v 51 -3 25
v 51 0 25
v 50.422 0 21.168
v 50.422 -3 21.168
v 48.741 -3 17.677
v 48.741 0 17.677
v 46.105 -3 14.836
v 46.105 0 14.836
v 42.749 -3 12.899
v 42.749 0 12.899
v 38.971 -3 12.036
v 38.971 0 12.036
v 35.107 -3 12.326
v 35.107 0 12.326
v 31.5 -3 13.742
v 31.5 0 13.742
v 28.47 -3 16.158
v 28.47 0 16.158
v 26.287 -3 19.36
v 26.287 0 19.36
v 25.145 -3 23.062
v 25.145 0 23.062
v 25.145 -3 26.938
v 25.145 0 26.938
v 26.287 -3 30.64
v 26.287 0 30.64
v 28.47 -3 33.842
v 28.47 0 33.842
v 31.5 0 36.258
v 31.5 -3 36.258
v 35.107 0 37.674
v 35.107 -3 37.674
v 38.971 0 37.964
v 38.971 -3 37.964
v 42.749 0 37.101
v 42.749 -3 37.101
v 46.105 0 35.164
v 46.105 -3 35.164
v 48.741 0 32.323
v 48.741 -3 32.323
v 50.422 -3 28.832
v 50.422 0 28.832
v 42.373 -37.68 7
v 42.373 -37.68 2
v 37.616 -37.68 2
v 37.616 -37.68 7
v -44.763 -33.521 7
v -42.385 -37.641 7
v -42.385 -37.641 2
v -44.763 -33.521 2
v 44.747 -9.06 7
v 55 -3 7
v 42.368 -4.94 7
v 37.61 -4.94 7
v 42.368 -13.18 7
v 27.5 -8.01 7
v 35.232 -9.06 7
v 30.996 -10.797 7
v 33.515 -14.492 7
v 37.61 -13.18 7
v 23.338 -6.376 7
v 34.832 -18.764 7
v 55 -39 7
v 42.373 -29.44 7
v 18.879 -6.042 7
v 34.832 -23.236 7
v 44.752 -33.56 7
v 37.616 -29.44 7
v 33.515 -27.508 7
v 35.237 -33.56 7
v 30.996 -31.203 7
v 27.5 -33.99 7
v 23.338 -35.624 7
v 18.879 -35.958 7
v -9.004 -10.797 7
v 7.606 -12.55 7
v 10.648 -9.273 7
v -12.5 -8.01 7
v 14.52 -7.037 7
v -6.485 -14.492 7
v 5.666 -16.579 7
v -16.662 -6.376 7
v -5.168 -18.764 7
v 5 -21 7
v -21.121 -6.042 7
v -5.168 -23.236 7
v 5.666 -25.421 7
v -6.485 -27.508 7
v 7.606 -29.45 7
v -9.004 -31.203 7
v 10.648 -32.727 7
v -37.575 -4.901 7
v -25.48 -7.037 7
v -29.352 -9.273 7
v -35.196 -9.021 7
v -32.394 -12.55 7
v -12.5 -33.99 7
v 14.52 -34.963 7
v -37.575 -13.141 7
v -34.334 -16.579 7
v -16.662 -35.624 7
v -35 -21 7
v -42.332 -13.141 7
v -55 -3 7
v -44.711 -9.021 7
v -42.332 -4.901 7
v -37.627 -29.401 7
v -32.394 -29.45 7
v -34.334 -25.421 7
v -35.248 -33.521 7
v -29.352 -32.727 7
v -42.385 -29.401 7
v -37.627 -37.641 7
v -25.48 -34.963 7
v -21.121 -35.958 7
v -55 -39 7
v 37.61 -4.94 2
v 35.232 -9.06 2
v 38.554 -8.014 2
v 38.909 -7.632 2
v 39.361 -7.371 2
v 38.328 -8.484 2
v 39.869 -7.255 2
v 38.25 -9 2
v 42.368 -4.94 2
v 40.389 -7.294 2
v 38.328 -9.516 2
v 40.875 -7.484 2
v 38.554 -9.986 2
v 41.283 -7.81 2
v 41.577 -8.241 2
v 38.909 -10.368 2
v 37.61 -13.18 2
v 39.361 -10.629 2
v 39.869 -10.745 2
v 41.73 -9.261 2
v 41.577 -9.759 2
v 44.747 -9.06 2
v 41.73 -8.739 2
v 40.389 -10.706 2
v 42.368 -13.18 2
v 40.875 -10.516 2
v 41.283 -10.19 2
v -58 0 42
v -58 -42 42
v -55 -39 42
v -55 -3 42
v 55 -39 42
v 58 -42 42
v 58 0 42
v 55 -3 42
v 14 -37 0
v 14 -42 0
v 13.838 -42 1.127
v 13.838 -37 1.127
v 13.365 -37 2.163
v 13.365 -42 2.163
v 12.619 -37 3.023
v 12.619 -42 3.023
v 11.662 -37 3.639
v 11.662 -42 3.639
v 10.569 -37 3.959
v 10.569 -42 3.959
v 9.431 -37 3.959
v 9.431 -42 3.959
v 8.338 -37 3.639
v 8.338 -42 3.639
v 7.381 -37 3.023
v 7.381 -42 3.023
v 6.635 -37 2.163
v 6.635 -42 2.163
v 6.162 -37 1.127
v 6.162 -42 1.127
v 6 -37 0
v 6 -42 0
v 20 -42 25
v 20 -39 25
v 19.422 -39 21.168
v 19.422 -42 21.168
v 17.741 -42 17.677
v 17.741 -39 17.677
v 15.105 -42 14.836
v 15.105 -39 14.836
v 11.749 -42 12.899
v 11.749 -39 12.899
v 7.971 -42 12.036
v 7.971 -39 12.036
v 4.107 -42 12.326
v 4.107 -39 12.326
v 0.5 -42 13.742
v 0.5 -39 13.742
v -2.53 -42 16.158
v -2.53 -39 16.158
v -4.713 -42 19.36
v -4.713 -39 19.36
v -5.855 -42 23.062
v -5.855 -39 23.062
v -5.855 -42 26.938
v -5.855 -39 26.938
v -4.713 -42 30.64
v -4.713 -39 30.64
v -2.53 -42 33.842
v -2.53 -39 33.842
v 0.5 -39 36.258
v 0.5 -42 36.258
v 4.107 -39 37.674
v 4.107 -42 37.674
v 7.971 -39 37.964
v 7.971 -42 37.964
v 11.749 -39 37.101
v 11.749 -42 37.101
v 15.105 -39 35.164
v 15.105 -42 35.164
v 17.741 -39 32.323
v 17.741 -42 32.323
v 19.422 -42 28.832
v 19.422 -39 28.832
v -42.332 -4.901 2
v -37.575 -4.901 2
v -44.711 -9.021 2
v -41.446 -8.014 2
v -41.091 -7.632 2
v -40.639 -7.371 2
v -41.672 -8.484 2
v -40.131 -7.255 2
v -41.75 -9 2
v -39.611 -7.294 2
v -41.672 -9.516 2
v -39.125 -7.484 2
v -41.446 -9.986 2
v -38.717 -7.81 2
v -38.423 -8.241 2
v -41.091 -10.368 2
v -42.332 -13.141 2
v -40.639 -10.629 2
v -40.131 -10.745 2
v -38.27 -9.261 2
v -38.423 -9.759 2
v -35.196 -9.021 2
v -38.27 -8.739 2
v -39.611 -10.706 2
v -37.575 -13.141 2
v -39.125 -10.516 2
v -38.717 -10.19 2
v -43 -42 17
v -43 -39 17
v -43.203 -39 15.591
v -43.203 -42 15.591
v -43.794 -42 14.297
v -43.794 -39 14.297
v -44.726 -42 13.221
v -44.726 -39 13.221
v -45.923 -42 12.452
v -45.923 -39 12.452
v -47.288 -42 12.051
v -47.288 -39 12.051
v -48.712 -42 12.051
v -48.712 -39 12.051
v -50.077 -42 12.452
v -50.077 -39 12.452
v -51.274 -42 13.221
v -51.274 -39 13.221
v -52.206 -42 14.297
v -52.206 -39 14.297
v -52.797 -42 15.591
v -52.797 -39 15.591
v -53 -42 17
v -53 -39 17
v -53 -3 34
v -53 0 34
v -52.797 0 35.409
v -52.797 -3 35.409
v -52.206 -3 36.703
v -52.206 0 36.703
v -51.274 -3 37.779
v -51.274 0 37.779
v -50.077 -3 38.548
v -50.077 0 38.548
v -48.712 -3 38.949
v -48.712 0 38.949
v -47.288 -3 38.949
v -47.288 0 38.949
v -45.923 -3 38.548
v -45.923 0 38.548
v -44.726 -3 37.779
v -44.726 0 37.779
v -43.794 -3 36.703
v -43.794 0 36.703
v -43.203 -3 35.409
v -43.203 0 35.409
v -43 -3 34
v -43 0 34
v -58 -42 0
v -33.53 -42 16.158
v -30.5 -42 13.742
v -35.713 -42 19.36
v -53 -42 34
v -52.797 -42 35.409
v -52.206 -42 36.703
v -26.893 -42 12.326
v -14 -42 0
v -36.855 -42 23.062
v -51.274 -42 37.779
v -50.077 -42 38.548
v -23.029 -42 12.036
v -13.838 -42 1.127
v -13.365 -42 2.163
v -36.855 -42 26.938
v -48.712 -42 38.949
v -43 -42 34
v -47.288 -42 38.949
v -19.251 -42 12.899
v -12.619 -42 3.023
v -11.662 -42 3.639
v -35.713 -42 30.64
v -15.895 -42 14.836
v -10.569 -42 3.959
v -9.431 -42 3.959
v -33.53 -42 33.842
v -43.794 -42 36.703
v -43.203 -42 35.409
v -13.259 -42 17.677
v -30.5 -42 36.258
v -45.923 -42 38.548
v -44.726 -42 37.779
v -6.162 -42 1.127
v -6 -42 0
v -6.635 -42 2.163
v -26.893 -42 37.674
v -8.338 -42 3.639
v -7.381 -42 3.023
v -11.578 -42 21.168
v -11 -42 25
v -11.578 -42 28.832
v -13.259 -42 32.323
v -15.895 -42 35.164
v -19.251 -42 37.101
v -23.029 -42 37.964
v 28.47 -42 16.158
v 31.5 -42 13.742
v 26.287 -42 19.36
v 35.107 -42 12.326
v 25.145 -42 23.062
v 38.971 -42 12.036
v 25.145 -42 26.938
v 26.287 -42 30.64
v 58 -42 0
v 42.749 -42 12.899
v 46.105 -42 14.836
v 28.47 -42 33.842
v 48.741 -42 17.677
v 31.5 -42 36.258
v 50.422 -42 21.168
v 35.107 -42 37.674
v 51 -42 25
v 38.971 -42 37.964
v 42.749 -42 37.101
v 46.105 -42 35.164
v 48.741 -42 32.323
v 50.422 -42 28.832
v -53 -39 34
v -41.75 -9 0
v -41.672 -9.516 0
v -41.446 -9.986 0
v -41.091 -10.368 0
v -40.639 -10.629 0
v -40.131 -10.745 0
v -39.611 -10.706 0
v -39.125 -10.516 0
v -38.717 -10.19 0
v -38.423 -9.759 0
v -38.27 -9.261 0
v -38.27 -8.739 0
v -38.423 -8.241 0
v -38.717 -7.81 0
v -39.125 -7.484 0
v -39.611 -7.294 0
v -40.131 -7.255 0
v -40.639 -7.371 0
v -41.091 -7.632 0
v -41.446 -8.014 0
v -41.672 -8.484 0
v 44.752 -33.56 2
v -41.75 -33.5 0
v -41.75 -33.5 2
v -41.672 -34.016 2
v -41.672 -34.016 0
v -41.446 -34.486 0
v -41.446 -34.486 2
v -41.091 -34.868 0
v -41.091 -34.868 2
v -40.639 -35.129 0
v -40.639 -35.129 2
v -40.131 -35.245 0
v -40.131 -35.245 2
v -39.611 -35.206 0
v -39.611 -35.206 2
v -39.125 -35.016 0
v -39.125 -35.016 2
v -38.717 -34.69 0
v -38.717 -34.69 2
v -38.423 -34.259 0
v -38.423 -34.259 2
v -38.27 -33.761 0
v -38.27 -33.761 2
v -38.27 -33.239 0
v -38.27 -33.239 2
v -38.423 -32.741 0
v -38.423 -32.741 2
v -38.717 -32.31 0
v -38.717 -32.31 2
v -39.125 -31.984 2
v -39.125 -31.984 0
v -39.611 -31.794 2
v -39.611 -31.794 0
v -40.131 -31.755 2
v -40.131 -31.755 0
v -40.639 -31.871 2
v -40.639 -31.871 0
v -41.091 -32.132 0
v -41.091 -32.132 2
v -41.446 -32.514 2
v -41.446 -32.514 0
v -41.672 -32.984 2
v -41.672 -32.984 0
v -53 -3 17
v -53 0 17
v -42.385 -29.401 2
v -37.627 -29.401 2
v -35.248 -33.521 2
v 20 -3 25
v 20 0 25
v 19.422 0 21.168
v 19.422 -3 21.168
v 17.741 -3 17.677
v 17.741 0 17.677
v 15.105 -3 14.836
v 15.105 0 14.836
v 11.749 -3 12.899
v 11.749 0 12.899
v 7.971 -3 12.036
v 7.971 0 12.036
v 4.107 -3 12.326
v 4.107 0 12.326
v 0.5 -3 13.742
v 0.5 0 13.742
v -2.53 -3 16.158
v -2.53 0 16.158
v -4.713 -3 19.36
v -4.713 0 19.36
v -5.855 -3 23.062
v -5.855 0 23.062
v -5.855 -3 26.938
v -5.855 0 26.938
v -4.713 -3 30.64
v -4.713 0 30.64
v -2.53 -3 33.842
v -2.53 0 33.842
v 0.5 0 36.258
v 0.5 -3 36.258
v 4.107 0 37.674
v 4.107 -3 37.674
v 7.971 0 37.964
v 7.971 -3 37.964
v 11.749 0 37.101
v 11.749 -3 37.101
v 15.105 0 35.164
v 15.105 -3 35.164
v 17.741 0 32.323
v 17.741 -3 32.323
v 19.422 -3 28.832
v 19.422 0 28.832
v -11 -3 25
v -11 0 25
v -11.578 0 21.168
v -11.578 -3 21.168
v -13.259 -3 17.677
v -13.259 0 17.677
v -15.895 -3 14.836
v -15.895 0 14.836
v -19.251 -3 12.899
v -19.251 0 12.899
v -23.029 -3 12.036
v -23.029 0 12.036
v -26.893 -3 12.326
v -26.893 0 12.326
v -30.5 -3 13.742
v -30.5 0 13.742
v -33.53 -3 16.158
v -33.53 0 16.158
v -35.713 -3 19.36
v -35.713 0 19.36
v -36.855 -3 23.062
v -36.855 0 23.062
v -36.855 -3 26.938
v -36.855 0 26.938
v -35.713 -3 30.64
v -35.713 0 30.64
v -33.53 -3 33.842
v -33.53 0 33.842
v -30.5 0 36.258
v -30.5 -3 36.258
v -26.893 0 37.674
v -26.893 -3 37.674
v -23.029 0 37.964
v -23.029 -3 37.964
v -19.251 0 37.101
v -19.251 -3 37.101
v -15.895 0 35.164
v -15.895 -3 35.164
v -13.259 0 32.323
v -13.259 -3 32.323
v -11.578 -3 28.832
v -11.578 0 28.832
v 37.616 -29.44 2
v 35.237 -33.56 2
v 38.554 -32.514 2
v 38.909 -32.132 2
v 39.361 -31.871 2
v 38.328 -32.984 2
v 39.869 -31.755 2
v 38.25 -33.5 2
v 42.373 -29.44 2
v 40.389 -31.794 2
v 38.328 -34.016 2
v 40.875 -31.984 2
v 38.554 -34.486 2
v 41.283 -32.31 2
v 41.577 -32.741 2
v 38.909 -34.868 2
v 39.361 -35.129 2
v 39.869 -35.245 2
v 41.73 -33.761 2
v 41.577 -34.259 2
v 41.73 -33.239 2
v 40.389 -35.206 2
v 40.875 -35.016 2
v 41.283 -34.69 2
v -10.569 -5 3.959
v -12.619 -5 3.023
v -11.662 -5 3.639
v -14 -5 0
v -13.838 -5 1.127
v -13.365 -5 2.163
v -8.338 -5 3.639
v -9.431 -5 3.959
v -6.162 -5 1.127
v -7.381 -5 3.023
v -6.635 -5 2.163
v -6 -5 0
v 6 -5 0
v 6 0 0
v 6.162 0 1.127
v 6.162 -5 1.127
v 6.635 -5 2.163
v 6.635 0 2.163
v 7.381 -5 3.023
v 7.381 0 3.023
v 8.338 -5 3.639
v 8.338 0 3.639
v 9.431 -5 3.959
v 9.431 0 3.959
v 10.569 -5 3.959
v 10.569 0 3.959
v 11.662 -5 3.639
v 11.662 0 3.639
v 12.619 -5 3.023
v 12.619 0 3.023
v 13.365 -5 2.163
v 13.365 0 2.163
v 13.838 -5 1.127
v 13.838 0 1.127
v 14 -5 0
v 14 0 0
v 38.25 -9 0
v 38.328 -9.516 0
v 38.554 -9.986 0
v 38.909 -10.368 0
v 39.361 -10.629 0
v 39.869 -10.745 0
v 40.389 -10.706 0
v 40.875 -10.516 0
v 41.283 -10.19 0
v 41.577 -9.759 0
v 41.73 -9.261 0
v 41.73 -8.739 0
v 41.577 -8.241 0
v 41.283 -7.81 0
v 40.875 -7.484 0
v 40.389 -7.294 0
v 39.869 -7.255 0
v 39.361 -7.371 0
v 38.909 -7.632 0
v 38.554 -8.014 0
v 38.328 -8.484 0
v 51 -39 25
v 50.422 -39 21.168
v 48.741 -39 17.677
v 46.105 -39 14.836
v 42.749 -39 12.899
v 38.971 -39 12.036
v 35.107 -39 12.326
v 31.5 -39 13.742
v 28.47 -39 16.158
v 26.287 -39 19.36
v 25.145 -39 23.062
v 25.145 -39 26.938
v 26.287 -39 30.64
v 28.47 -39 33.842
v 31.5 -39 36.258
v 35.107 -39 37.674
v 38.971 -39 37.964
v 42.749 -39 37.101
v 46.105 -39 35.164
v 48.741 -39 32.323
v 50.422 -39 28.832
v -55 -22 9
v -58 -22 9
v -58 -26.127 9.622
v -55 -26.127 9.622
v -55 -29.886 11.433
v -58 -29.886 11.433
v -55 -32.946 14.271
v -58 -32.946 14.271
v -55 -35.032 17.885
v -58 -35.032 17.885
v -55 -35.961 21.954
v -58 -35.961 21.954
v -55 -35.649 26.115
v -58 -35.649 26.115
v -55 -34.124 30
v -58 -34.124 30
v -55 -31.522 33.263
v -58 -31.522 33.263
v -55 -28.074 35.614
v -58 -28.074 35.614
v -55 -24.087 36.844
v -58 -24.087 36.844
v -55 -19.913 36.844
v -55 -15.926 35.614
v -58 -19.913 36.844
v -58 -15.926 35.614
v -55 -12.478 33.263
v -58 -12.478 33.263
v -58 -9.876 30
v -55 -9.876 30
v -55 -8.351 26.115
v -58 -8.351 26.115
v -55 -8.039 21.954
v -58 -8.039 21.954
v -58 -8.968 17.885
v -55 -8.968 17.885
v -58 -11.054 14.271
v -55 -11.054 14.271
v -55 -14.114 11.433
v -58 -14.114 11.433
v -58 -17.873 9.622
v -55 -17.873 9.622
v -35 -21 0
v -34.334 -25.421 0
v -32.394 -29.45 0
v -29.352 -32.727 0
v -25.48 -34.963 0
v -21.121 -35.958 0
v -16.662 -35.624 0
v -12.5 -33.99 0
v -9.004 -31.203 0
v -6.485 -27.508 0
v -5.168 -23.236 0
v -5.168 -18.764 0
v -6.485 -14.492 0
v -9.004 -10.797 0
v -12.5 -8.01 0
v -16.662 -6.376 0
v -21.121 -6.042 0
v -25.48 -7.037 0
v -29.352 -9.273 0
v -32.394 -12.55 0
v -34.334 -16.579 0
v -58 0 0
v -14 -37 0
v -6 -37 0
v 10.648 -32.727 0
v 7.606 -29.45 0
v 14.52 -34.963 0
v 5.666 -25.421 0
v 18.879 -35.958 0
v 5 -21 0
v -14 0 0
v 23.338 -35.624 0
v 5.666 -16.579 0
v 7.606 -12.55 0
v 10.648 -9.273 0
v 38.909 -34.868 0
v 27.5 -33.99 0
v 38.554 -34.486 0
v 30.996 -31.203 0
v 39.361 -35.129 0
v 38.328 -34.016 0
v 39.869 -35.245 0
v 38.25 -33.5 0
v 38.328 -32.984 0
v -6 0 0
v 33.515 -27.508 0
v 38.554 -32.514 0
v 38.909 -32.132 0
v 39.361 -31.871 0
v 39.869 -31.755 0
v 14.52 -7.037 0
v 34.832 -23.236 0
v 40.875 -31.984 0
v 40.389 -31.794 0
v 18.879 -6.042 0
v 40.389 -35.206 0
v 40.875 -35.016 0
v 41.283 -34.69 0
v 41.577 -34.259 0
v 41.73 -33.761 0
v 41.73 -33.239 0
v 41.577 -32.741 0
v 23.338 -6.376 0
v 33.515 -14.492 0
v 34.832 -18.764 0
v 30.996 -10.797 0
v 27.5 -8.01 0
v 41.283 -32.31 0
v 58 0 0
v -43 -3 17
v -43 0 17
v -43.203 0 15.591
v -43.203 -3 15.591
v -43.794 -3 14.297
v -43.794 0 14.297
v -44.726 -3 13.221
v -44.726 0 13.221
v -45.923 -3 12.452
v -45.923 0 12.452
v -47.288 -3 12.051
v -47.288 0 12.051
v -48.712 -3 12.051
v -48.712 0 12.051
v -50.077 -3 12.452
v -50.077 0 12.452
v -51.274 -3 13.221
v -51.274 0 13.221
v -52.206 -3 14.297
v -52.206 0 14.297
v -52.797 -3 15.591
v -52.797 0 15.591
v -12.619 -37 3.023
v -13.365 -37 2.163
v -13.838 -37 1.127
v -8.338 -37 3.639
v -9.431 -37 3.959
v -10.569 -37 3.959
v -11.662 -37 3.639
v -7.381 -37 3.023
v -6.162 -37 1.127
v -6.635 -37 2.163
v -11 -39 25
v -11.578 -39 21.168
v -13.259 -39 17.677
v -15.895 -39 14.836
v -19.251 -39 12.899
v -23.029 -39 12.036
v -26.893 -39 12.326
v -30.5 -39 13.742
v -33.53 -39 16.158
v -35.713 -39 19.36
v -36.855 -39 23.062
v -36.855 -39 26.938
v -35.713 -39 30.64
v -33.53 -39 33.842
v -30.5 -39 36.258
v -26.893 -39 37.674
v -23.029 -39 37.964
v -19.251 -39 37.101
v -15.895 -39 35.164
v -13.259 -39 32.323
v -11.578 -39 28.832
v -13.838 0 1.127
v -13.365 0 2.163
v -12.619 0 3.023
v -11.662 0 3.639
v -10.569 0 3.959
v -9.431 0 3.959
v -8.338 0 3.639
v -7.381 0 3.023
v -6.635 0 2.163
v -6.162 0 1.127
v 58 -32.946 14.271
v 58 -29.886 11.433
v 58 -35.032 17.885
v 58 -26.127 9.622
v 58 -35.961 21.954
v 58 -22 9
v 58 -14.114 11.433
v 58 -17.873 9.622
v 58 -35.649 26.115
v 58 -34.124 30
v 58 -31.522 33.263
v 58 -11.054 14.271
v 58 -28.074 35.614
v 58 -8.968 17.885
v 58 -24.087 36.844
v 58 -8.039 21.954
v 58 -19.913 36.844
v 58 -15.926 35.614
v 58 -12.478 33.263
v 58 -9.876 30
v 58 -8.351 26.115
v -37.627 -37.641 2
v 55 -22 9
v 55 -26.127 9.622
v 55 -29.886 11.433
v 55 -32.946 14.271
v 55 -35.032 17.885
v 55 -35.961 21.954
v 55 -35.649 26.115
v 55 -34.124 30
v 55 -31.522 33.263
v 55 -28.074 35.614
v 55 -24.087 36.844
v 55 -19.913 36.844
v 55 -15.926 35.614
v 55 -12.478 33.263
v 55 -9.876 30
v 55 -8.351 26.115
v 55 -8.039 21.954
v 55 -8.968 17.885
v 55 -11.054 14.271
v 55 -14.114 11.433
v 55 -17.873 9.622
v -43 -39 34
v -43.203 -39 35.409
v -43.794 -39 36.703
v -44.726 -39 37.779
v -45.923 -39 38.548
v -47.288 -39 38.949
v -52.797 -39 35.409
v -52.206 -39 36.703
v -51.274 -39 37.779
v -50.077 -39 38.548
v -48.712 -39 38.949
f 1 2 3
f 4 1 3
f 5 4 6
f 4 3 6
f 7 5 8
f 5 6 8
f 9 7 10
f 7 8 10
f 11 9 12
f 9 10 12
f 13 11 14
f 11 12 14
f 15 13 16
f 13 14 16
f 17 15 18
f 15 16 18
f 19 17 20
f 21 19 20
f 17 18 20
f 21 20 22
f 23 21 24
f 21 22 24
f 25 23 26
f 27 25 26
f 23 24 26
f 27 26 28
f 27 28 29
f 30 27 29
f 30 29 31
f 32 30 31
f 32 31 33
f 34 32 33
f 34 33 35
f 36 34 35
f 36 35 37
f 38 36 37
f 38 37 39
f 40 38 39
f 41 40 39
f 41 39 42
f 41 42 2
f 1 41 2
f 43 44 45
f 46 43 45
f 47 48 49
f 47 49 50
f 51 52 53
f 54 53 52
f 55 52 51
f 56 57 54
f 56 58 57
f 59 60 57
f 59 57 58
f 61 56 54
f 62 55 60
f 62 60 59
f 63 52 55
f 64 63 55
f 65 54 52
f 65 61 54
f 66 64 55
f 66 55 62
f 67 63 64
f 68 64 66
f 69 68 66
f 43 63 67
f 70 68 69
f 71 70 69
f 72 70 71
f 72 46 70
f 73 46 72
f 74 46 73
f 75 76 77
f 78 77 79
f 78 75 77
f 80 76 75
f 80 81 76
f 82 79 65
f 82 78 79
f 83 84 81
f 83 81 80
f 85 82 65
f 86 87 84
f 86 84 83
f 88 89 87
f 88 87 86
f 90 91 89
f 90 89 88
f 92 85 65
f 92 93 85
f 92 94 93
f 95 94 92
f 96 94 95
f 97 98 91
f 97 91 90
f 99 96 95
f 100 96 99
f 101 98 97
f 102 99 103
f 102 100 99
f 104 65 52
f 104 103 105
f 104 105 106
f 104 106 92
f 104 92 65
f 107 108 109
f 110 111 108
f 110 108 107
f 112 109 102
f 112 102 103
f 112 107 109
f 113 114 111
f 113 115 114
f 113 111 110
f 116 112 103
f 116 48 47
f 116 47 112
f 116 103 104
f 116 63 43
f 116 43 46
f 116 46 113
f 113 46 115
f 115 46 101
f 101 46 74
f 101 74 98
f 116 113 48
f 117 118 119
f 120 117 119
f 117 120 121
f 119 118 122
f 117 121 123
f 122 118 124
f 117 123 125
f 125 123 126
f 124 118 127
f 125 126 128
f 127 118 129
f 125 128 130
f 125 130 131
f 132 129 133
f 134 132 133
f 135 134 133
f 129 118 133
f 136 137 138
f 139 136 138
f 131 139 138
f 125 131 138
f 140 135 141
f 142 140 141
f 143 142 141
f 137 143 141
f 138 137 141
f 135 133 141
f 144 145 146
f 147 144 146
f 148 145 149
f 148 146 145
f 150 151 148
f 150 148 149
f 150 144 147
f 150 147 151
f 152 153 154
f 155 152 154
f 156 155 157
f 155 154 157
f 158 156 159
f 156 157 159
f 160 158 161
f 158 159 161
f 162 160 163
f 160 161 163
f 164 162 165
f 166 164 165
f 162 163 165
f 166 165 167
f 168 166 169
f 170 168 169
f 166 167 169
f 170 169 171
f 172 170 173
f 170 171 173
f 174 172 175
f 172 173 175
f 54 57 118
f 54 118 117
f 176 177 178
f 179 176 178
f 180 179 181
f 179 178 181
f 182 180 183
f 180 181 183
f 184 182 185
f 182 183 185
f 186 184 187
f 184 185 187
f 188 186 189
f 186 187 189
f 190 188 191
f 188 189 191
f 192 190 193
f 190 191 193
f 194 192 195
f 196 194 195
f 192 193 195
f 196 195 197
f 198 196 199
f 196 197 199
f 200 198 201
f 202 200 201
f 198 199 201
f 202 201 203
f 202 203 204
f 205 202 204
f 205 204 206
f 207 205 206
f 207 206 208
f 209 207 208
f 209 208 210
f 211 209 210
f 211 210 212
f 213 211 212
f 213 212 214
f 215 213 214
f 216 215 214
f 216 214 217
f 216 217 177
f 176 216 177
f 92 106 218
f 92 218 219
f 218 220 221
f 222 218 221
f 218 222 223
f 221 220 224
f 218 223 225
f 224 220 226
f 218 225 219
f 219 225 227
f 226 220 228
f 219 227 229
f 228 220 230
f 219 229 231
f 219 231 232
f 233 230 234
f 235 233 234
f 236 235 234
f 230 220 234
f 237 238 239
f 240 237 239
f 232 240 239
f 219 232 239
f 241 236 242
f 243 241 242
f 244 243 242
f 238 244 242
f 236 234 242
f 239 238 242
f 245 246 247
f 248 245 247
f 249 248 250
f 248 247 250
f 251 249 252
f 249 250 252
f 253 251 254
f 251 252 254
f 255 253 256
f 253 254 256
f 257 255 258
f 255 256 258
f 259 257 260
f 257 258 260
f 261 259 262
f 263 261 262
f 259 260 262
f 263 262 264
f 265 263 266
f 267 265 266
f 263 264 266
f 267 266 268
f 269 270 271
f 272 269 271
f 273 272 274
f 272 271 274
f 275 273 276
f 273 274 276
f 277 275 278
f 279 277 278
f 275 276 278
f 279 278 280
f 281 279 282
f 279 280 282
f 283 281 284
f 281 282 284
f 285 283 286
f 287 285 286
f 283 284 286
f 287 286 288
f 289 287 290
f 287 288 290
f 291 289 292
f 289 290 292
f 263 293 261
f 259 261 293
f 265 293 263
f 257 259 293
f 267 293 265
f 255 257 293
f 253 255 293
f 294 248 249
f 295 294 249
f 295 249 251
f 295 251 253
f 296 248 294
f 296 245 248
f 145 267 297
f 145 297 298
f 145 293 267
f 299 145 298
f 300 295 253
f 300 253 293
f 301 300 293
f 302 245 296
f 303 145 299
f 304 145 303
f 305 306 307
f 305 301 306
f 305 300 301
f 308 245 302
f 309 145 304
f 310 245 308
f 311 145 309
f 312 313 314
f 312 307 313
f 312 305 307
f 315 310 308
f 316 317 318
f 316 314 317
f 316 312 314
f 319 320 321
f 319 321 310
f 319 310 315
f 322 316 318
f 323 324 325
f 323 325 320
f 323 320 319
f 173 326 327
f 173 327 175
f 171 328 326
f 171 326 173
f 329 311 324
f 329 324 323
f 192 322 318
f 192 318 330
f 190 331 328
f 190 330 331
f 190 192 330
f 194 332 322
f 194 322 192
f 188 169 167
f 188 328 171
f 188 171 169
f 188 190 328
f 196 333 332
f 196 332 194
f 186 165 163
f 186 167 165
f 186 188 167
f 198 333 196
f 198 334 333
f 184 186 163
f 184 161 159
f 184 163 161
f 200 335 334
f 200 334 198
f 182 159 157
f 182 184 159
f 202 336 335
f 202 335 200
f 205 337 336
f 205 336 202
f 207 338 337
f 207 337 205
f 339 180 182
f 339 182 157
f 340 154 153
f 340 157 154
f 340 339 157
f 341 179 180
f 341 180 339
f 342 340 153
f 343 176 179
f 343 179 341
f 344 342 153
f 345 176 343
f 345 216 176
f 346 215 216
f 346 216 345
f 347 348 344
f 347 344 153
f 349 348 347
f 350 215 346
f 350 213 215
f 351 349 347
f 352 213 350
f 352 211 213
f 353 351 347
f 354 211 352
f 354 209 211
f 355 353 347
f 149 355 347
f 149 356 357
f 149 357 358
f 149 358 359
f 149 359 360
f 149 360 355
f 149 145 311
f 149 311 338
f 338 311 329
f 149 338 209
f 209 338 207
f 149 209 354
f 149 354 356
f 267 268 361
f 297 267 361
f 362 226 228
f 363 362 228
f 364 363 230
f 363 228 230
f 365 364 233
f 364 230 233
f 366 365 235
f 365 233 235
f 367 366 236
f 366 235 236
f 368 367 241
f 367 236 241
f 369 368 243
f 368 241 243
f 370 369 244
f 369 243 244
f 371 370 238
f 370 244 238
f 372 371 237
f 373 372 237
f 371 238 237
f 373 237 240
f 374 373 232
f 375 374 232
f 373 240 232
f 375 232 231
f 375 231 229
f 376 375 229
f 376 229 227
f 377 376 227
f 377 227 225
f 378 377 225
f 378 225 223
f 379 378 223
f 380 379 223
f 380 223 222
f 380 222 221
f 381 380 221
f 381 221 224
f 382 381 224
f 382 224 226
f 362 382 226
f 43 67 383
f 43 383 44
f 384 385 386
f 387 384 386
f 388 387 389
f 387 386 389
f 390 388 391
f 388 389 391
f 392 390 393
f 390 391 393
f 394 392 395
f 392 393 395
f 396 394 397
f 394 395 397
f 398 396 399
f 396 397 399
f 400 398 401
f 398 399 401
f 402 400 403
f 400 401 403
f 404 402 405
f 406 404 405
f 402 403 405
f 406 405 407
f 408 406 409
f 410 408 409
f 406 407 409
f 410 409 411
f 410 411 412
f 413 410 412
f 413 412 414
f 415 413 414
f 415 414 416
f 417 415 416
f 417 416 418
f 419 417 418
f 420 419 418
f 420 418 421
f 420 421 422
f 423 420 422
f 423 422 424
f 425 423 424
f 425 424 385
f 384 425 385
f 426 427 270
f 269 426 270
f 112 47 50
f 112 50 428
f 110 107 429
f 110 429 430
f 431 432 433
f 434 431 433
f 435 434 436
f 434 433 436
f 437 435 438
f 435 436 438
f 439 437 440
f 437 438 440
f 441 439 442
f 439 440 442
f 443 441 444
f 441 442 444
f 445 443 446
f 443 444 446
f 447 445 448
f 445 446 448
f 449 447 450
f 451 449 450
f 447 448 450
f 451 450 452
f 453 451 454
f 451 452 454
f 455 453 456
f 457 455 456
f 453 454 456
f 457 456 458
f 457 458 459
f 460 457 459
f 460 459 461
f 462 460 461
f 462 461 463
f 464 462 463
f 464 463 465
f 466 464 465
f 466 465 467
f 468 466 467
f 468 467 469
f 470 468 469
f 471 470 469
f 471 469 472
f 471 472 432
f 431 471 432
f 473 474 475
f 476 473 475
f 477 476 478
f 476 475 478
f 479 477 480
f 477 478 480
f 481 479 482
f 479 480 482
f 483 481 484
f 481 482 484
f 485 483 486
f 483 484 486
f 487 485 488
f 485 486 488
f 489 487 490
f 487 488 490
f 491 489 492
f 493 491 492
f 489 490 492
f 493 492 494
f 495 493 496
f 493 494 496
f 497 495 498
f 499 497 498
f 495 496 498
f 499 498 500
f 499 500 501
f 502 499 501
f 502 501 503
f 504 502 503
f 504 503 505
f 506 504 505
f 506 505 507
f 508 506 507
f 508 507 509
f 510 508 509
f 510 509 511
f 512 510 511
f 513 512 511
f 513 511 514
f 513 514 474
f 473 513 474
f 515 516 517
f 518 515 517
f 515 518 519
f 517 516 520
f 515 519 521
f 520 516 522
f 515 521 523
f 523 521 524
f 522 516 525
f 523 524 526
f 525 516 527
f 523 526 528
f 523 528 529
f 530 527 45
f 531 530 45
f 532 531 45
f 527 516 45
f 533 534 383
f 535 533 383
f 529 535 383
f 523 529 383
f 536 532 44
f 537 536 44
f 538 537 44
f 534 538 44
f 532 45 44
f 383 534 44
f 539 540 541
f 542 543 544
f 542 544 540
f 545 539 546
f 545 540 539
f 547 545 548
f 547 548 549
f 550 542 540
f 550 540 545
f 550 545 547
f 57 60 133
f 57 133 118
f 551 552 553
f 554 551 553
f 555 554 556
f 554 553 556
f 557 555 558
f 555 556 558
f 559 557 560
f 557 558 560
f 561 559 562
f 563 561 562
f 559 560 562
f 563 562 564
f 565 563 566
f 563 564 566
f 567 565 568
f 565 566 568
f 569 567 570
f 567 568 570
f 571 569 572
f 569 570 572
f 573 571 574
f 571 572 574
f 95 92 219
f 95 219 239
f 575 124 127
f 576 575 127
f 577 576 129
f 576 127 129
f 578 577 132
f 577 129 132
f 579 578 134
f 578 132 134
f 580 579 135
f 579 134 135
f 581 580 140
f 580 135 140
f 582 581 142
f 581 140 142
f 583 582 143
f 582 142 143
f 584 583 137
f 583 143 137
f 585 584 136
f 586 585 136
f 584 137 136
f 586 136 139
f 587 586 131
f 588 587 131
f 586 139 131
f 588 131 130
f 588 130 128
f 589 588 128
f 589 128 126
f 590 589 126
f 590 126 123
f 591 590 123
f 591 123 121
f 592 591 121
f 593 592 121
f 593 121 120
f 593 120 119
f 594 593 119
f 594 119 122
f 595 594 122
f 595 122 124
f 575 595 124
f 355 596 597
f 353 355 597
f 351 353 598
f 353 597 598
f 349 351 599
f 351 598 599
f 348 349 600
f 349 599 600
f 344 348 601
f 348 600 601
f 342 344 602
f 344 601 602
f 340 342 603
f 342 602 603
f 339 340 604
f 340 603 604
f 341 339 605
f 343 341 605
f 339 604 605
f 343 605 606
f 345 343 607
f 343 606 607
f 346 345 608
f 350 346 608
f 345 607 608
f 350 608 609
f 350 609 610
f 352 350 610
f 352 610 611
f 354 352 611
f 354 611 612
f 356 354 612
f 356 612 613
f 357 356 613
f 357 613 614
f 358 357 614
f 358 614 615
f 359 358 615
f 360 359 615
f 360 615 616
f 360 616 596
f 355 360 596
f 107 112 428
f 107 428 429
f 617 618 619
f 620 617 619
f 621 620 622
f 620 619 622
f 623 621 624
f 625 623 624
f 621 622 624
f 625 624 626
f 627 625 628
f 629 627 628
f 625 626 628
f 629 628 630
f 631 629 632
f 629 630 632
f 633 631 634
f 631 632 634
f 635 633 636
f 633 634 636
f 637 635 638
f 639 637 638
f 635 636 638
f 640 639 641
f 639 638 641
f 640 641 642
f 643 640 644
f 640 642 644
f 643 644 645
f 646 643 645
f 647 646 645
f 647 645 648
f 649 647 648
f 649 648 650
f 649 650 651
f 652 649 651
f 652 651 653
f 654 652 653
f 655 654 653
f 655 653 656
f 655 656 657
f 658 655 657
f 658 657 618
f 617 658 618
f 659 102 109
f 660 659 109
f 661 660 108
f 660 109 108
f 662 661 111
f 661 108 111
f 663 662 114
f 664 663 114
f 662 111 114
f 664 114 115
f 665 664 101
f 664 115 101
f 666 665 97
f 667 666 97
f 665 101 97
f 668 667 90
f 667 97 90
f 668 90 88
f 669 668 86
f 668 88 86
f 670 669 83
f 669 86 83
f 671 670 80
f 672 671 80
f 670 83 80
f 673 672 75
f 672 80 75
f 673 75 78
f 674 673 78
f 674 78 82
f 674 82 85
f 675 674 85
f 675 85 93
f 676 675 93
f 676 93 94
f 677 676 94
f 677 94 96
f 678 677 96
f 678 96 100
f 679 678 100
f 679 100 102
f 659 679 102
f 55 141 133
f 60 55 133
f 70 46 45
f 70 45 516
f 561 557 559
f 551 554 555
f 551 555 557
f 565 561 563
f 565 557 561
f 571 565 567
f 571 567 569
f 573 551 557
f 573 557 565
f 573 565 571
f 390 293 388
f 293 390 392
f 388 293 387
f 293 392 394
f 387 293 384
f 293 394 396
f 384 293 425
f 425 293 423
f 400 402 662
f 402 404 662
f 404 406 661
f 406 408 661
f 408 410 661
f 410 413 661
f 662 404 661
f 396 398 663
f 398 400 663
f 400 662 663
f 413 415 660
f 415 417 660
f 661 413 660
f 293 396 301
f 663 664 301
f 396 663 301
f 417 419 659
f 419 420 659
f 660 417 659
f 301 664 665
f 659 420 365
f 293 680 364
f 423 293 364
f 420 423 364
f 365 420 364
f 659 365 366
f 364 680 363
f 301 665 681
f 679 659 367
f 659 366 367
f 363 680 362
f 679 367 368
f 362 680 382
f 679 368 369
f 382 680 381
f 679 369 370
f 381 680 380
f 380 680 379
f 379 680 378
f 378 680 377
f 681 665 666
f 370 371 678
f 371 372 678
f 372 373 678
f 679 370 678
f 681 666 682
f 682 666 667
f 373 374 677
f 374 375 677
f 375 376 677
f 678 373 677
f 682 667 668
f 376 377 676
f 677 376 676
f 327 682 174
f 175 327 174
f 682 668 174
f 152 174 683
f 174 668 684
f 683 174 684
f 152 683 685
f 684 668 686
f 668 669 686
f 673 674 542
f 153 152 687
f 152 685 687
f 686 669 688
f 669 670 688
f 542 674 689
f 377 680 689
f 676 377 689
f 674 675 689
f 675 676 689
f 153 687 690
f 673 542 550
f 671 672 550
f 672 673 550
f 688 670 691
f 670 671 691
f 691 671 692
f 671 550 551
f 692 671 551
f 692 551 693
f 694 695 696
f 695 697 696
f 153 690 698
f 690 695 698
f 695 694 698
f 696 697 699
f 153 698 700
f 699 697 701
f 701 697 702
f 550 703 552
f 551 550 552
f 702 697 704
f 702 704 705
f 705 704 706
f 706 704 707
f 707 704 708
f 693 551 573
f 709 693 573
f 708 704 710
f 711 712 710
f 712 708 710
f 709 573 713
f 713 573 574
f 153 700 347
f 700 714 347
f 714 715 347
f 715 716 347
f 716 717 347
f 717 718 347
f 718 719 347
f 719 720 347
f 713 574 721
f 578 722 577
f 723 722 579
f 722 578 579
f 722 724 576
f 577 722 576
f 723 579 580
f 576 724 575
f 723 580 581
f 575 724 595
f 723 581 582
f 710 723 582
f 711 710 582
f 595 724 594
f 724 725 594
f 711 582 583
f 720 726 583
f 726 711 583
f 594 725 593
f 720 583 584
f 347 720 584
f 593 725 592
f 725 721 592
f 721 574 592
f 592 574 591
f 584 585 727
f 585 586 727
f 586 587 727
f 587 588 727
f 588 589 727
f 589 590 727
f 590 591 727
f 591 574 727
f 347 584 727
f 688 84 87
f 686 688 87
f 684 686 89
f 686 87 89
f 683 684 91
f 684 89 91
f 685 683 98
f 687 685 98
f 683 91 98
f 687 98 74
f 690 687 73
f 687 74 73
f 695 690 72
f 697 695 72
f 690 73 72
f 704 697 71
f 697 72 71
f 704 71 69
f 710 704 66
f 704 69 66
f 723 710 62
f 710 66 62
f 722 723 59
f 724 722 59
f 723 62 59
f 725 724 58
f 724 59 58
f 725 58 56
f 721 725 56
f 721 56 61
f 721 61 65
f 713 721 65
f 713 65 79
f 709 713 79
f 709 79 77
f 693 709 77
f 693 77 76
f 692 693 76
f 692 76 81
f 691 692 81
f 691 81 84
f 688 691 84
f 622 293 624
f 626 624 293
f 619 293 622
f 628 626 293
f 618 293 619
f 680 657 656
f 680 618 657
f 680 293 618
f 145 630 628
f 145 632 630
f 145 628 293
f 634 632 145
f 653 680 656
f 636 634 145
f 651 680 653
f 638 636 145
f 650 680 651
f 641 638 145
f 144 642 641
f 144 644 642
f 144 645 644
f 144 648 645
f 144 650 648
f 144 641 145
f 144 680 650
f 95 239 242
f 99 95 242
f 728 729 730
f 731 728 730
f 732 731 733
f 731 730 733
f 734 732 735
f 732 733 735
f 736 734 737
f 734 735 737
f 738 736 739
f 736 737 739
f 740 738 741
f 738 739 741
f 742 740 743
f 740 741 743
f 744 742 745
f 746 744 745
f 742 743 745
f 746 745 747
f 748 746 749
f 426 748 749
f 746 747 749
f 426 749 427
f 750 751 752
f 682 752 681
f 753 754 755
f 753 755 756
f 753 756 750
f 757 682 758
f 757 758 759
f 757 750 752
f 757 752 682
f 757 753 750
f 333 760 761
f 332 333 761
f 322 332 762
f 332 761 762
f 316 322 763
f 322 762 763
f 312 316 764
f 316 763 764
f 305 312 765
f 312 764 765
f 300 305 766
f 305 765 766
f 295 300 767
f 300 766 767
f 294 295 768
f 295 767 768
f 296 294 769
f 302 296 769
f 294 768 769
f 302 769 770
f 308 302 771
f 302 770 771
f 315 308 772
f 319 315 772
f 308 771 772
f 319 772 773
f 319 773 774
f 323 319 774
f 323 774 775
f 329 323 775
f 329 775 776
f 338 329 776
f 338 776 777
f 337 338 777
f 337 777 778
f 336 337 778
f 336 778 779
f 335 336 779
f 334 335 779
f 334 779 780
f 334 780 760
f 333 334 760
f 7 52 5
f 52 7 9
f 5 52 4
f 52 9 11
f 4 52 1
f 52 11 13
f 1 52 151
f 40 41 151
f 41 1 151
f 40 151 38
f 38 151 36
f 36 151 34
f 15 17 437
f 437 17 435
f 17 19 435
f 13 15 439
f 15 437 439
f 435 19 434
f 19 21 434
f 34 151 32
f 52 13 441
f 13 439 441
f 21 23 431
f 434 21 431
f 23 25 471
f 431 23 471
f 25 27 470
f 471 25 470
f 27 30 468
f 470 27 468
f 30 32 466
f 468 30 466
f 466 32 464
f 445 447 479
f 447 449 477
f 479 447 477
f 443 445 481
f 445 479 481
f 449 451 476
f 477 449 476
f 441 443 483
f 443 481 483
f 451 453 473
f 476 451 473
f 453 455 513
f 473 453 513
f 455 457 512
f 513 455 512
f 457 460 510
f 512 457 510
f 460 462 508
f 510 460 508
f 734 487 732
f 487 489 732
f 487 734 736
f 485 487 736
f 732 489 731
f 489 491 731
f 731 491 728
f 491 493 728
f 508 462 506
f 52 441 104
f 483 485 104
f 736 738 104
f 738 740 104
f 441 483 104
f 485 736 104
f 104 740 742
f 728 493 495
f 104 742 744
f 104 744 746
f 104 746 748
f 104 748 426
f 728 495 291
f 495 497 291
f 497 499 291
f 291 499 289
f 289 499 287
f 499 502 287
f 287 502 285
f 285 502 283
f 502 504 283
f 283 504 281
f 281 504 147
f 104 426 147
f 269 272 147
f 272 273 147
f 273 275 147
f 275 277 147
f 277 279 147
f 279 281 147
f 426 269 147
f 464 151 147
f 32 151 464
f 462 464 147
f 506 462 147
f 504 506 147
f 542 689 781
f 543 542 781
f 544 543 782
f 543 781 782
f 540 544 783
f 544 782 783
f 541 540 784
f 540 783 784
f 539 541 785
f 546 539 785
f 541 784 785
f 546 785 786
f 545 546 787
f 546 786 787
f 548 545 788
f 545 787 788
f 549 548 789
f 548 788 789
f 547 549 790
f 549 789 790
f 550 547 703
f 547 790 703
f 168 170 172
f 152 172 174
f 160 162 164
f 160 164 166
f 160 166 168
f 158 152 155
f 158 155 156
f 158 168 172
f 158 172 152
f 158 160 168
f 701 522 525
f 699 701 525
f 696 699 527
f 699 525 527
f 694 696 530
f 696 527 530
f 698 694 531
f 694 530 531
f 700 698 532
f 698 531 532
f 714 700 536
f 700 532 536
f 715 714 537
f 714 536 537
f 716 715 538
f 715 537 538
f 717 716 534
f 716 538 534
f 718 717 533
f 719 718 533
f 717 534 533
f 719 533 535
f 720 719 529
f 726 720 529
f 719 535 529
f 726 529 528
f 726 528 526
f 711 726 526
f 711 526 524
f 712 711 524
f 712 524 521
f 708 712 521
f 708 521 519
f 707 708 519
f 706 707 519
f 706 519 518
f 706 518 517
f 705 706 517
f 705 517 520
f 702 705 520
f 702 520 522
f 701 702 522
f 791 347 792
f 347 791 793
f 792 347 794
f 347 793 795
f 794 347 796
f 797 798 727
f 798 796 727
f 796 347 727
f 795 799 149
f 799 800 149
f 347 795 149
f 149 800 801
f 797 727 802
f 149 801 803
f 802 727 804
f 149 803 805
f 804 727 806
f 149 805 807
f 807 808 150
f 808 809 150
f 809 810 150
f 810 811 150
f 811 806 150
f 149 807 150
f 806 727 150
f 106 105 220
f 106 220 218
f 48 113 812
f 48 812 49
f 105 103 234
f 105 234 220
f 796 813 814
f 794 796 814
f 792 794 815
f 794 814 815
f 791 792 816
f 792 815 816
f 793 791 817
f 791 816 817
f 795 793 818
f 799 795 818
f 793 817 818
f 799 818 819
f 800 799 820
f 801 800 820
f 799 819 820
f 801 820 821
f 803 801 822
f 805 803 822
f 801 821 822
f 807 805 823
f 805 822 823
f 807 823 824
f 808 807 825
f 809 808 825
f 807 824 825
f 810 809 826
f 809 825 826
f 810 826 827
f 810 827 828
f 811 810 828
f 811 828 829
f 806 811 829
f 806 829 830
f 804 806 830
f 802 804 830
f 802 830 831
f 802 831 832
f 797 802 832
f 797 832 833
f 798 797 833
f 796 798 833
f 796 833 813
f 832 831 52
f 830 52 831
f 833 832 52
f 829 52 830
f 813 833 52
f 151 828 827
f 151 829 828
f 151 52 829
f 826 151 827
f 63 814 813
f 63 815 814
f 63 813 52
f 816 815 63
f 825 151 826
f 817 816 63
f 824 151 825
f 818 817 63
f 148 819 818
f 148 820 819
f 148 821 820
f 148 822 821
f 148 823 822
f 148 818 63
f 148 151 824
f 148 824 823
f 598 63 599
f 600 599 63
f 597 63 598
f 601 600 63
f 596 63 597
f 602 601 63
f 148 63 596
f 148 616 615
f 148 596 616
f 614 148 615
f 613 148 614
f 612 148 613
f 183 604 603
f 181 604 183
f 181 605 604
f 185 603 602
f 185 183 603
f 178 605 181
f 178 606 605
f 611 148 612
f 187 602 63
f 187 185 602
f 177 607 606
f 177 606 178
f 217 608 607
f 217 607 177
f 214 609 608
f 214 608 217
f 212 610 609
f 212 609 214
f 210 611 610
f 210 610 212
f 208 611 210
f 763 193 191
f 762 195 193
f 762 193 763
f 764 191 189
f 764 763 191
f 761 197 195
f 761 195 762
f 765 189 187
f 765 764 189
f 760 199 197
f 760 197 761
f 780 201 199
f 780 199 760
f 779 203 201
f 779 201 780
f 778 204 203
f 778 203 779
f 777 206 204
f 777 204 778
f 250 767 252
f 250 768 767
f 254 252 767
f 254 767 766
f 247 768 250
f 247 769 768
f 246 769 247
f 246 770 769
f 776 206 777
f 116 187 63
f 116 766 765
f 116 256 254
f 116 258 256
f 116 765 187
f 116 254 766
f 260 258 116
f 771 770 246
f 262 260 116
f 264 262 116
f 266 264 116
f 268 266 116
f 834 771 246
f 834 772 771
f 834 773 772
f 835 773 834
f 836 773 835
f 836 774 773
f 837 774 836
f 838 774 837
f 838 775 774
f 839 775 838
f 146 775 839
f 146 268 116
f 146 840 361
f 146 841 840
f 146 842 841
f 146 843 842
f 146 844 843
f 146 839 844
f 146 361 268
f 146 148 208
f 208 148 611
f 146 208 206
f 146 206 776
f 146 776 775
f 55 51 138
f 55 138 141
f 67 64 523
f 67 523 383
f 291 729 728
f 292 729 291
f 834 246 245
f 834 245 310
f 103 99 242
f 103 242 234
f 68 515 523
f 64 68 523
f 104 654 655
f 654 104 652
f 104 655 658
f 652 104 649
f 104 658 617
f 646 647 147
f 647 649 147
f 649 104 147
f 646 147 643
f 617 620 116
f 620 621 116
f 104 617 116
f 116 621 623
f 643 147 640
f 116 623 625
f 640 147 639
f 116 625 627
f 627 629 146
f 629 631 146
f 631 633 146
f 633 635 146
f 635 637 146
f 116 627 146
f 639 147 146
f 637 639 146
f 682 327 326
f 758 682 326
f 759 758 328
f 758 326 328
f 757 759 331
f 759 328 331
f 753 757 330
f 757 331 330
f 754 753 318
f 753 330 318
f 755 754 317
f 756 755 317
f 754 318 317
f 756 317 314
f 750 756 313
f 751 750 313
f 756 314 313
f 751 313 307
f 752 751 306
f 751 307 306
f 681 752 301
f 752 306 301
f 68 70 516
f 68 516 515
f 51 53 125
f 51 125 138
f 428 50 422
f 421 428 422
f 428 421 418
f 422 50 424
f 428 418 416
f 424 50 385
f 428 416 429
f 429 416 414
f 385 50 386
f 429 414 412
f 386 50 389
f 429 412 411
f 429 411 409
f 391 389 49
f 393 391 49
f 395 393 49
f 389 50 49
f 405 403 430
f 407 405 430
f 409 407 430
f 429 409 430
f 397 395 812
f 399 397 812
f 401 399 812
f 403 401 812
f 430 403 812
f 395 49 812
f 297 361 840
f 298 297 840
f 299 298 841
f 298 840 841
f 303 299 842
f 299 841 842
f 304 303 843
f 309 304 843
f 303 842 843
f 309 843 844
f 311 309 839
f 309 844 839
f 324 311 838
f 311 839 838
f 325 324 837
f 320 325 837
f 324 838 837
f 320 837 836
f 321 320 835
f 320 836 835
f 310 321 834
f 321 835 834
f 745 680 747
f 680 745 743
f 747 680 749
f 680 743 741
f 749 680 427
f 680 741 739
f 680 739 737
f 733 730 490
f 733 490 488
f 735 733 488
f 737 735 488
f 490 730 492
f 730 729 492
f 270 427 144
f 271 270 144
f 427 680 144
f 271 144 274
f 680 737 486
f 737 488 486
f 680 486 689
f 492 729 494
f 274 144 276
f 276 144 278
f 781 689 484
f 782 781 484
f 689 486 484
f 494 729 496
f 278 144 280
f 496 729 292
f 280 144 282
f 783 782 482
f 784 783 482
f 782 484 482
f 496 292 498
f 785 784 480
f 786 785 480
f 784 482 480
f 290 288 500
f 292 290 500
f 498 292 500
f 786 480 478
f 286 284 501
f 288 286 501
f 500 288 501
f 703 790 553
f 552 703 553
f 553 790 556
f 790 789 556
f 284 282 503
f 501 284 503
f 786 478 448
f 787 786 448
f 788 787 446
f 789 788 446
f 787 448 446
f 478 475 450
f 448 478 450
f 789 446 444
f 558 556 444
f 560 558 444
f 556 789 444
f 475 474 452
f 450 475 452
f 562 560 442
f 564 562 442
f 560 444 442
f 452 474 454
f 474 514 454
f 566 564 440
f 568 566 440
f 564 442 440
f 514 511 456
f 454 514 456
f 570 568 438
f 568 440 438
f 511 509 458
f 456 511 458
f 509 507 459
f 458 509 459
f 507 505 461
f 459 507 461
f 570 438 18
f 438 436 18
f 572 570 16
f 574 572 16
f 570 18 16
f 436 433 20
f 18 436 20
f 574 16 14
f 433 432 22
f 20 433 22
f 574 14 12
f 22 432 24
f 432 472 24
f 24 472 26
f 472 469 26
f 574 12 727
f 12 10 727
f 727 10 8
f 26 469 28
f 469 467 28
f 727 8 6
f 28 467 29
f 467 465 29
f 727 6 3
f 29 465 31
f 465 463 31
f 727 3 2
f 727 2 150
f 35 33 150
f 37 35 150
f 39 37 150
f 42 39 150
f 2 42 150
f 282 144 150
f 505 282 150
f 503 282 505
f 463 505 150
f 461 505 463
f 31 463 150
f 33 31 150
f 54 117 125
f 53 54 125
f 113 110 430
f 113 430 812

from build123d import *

# Parameters (mm, degrees)
SKETCH_W        = 116
SKETCH_H        = 42
PAD_DEPTH       = 42
SKETCH005_W     = 110
SKETCH005_H     = 36
POCKET_DEPTH    = 35
SKETCH006_R     = 1.75
SKETCH006_R_2   = 15
POCKET001_DEPTH = 7.001
POCKET002_DEPTH = 5
SKETCH007_R     = 13
POCKET003_DEPTH = 42.001
SKETCH008_R     = 14
POCKET004_DEPTH = 116.001
SKETCH012_R     = 4
POCKET005_DEPTH = 5
SKETCH013_R     = 4
POCKET006_DEPTH = 5


with BuildPart() as part:
    # Sketch → Pad (new body)
    with BuildSketch(Plane.XZ):
        with Locations((0, 21)):
            Rectangle(SKETCH_W, SKETCH_H)
    extrude(amount=PAD_DEPTH)

    # Sketch005 → Pocket (cut)
    with BuildSketch(Plane(origin=(0, 0, 42), x_dir=(-1, 0, 0), z_dir=(0, 0, 1))):
        with Locations((0, 21)):
            Rectangle(SKETCH005_W, SKETCH005_H)
    extrude(amount=-POCKET_DEPTH, mode=Mode.SUBTRACT)

    # Sketch006 → Pocket001 (cut, through all)
    with BuildSketch(Plane(origin=(0, 0, 7), x_dir=(-1, 0, 0), z_dir=(0, 0, 1))):
        with Locations((-40, 33.5)):
            Circle(SKETCH006_R)
        with Locations((40, 33.5)):
            Circle(SKETCH006_R)
        with Locations((-40, 9)):
            Circle(SKETCH006_R)
        with Locations((40, 9)):
            Circle(SKETCH006_R)
        with Locations((-20, 21)):
            Circle(SKETCH006_R_2)
        with Locations((20, 21)):
            Circle(SKETCH006_R_2)
    extrude(amount=-POCKET001_DEPTH, mode=Mode.SUBTRACT)

    # Sketch011 → Pocket002 (cut)
    with BuildSketch(Plane(origin=(0, 0, 7), x_dir=(-1, 0, 0), z_dir=(0, 0, 1))):
        Polygon((-42.373287, 37.679591), (-37.615921, 37.679591), (-35.237238, 33.559591), (-37.615921, 29.439591), (-42.373287, 29.439591), (-44.75197, 33.559591), align=None)
        Polygon((37.627177, 37.64135), (42.384544, 37.64135), (44.763227, 33.52135), (42.384544, 29.40135), (37.627177, 29.40135), (35.248494, 33.52135), align=None)
        Polygon((37.575129, 13.14135), (42.332495, 13.14135), (44.711178, 9.02135), (42.332495, 4.90135), (37.575129, 4.90135), (35.196446, 9.02135), align=None)
        Polygon((-42.367844, 13.179591), (-37.610478, 13.179591), (-35.231795, 9.059591), (-37.610478, 4.939591), (-42.367844, 4.939591), (-44.746527, 9.059591), align=None)
    extrude(amount=-POCKET002_DEPTH, mode=Mode.SUBTRACT)

    # Sketch007 → Pocket003 (cut, through all)
    with BuildSketch(Plane(origin=(0, 0, 0), x_dir=(1, 0, 0), z_dir=(0, 1, 0))):
        with Locations((-24, -25)):
            Circle(SKETCH007_R)
        with Locations((7, -25)):
            Circle(SKETCH007_R)
        with Locations((38, -25)):
            Circle(SKETCH007_R)
        with BuildLine():
            ThreePointArc((-43, -16.999991), (-48, -12), (-53, -16.999992))
            Line((-53, -16.999992), (-53, -33.999979))
            ThreePointArc((-53, -33.999979), (-48, -39), (-43, -33.999978))
            Line((-43, -16.999991), (-43, -33.999978))
        make_face()
    extrude(amount=-POCKET003_DEPTH, mode=Mode.SUBTRACT)

    # Sketch008 → Pocket004 (cut, through all)
    with BuildSketch(Plane(origin=(-58, 0, 0), x_dir=(0, 0, -1), z_dir=(-1, 0, 0))):
        with Locations((-23, 22)):
            Circle(SKETCH008_R)
    extrude(amount=-POCKET004_DEPTH, mode=Mode.SUBTRACT)

    # Sketch012 → Pocket005 (cut)
    with BuildSketch(Plane(origin=(0, 0, 0), x_dir=(1, 0, 0), z_dir=(0, 1, 0))):
        with Locations((-10, 0)):
            Circle(SKETCH012_R)
        with Locations((10, 0)):
            Circle(SKETCH012_R)
    extrude(amount=-POCKET005_DEPTH, mode=Mode.SUBTRACT)

    # Sketch013 → Pocket006 (cut)
    with BuildSketch(Plane.XZ.offset(42)):
        with Locations((-10, 0)):
            Circle(SKETCH013_R)
        with Locations((10, 0)):
            Circle(SKETCH013_R)
    extrude(amount=-POCKET006_DEPTH, mode=Mode.SUBTRACT)


solid = part.part
